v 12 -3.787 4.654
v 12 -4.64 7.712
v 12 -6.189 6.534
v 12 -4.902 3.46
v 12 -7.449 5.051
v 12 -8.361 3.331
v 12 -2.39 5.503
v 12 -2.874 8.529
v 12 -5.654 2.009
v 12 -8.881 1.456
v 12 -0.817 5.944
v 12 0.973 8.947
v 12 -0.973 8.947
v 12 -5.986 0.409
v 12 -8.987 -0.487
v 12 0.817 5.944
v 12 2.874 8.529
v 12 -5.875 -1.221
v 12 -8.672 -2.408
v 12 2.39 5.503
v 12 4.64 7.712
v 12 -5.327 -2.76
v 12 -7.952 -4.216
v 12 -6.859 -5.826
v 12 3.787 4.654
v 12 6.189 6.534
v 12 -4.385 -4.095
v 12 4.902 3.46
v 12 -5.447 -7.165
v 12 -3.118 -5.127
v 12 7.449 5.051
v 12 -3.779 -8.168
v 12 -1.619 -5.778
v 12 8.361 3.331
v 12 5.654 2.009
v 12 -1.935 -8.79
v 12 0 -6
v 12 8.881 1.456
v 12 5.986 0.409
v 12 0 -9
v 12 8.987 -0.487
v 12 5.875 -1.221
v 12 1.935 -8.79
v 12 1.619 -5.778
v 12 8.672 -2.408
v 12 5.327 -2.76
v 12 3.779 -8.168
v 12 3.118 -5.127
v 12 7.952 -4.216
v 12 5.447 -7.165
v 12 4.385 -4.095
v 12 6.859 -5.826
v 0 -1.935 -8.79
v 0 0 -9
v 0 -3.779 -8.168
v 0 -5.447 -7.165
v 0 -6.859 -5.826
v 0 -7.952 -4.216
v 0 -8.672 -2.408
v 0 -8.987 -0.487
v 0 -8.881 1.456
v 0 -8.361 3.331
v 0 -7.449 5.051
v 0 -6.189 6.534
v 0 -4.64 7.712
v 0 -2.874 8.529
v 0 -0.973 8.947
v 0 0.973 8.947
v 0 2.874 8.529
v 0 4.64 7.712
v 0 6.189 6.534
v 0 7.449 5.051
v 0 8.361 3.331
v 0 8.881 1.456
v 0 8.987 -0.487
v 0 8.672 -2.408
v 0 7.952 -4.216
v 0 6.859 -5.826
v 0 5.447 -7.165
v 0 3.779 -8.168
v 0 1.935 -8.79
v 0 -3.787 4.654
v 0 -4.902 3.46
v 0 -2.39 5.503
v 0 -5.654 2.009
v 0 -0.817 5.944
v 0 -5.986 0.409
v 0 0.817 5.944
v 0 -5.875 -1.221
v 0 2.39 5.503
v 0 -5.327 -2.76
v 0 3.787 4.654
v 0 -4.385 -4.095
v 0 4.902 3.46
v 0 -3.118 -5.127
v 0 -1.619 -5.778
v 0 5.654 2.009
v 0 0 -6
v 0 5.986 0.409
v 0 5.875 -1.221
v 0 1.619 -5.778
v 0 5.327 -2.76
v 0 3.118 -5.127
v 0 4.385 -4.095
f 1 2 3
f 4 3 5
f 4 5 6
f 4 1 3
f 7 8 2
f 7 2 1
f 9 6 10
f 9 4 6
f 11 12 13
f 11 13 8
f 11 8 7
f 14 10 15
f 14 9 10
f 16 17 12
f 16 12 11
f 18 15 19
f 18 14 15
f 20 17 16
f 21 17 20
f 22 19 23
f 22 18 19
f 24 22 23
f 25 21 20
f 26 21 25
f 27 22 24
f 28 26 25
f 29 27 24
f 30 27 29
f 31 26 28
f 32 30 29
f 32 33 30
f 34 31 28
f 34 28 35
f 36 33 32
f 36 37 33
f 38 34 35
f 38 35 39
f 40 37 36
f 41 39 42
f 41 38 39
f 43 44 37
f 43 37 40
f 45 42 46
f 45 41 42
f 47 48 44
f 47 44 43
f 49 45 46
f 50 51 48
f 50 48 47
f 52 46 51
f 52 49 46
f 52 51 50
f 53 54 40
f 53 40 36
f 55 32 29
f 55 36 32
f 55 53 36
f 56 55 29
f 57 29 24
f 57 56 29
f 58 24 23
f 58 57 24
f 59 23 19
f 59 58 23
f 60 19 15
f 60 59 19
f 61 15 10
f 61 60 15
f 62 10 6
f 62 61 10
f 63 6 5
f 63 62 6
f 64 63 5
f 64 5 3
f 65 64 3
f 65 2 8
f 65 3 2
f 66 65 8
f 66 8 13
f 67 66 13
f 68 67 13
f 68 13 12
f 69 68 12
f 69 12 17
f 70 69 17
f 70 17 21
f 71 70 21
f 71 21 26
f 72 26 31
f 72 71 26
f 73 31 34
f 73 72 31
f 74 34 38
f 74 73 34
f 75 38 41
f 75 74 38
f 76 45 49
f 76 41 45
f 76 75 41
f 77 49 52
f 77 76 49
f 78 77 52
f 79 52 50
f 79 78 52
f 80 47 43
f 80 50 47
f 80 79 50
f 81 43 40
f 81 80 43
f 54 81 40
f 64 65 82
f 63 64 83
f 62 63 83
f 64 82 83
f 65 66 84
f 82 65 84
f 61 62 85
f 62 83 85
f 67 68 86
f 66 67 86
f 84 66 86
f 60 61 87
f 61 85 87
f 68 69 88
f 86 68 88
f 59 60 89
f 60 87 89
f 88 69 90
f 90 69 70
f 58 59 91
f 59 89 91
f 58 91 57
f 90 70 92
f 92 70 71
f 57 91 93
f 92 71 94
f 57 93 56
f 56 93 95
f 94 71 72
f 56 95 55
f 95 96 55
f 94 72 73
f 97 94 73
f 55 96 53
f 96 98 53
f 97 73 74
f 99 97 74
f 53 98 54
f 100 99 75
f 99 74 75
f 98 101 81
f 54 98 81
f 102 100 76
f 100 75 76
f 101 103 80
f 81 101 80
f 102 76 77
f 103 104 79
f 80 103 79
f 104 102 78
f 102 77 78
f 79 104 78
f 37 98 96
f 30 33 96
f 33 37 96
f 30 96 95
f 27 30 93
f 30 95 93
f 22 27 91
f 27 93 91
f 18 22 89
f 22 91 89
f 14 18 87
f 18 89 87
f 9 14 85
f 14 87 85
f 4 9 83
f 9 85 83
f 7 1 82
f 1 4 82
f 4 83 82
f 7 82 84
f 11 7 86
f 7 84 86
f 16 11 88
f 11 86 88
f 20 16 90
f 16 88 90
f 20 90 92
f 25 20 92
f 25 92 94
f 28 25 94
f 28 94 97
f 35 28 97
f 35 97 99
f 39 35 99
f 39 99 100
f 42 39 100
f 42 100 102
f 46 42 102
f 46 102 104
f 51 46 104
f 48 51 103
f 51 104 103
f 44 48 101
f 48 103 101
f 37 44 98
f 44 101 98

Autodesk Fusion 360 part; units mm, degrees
sketch "Sketch1" plane through (0, 0, 0) normal (1, 0, 0) x (0, 0, -1)
  circle A0 centre (0, 0) radius 6
  circle A1 centre (0, 0) radius 9
  dimension "d1" = 12
  dimension "d2" = 18
extrude "Extrude1" add sketch "Sketch1" along normal blind 12 makes body 1
copy_body "Body->Comp1" bodies 1 removing the originals makes body 2 in component "12x18x12 bushing"
component "12x18x12 bushing" placed x (1, 0, 0) y (0, 1, 0) z (0, 0, 1) at (0, 0, 0)
